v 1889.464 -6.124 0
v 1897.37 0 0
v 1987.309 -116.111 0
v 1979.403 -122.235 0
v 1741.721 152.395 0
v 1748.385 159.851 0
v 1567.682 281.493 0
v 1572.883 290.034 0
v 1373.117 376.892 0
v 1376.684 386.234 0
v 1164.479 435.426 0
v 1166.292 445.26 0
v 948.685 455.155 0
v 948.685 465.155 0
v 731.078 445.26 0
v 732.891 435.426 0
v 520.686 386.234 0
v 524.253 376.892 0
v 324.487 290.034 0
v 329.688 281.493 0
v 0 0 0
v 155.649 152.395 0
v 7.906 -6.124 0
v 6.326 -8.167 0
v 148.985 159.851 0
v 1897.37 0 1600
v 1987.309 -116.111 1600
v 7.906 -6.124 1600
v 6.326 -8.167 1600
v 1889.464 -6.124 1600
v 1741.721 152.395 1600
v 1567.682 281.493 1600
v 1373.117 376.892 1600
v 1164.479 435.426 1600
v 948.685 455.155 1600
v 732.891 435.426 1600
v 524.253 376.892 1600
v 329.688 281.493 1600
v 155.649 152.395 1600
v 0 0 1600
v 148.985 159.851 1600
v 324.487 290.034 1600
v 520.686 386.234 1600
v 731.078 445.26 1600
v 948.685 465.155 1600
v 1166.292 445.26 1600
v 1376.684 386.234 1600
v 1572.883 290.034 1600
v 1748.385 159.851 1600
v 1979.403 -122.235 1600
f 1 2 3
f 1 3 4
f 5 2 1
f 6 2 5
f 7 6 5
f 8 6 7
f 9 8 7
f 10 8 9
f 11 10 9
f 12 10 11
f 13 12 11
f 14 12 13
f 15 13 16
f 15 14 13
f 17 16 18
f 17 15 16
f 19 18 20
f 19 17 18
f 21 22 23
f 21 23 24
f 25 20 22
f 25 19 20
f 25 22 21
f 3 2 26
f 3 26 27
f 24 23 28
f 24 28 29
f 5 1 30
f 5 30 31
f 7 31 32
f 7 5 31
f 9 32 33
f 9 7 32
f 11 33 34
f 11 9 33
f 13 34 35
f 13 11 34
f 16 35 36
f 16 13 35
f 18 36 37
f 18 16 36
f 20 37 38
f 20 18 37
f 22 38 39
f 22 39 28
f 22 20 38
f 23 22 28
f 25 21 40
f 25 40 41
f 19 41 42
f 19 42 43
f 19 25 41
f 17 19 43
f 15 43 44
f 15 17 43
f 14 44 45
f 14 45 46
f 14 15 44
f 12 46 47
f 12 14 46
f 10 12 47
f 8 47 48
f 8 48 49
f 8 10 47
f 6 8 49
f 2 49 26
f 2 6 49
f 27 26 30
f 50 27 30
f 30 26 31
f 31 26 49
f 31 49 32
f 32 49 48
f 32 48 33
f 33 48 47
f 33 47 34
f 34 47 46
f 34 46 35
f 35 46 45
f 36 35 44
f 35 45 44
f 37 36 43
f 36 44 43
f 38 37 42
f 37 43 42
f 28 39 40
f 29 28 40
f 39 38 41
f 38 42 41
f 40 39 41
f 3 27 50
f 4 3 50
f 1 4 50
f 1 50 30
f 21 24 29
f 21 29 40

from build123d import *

# Parameters (mm, degrees)
BOSS_EXTRUDE1_DEPTH = 1600


with BuildPart() as part:
    # Sketch1 → Boss-Extrude1 (new body)
    with BuildSketch(Plane.XY):
        with BuildLine():
            Line((1897.37, 0), (1987.30887071, -116.111138292))
            Line((1987.30887071, -116.111138292), (1979.403162377, -122.234844339))
            Line((1979.403162377, -122.234844339), (1889.464291667, -6.123706047))
            ThreePointArc((1889.464291667, -6.123706047), (948.685, 455.155274378), (7.905708333, -6.123706047))
            Line((7.905708333, -6.123706047), (6.326316618, -8.167278707))
            Line((6.326316618, -8.167278707), (0, 0))
            ThreePointArc((0, 0), (948.685, 465.155274378), (1897.37, 0))
        make_face()
    extrude(amount=BOSS_EXTRUDE1_DEPTH)


solid = part.part
